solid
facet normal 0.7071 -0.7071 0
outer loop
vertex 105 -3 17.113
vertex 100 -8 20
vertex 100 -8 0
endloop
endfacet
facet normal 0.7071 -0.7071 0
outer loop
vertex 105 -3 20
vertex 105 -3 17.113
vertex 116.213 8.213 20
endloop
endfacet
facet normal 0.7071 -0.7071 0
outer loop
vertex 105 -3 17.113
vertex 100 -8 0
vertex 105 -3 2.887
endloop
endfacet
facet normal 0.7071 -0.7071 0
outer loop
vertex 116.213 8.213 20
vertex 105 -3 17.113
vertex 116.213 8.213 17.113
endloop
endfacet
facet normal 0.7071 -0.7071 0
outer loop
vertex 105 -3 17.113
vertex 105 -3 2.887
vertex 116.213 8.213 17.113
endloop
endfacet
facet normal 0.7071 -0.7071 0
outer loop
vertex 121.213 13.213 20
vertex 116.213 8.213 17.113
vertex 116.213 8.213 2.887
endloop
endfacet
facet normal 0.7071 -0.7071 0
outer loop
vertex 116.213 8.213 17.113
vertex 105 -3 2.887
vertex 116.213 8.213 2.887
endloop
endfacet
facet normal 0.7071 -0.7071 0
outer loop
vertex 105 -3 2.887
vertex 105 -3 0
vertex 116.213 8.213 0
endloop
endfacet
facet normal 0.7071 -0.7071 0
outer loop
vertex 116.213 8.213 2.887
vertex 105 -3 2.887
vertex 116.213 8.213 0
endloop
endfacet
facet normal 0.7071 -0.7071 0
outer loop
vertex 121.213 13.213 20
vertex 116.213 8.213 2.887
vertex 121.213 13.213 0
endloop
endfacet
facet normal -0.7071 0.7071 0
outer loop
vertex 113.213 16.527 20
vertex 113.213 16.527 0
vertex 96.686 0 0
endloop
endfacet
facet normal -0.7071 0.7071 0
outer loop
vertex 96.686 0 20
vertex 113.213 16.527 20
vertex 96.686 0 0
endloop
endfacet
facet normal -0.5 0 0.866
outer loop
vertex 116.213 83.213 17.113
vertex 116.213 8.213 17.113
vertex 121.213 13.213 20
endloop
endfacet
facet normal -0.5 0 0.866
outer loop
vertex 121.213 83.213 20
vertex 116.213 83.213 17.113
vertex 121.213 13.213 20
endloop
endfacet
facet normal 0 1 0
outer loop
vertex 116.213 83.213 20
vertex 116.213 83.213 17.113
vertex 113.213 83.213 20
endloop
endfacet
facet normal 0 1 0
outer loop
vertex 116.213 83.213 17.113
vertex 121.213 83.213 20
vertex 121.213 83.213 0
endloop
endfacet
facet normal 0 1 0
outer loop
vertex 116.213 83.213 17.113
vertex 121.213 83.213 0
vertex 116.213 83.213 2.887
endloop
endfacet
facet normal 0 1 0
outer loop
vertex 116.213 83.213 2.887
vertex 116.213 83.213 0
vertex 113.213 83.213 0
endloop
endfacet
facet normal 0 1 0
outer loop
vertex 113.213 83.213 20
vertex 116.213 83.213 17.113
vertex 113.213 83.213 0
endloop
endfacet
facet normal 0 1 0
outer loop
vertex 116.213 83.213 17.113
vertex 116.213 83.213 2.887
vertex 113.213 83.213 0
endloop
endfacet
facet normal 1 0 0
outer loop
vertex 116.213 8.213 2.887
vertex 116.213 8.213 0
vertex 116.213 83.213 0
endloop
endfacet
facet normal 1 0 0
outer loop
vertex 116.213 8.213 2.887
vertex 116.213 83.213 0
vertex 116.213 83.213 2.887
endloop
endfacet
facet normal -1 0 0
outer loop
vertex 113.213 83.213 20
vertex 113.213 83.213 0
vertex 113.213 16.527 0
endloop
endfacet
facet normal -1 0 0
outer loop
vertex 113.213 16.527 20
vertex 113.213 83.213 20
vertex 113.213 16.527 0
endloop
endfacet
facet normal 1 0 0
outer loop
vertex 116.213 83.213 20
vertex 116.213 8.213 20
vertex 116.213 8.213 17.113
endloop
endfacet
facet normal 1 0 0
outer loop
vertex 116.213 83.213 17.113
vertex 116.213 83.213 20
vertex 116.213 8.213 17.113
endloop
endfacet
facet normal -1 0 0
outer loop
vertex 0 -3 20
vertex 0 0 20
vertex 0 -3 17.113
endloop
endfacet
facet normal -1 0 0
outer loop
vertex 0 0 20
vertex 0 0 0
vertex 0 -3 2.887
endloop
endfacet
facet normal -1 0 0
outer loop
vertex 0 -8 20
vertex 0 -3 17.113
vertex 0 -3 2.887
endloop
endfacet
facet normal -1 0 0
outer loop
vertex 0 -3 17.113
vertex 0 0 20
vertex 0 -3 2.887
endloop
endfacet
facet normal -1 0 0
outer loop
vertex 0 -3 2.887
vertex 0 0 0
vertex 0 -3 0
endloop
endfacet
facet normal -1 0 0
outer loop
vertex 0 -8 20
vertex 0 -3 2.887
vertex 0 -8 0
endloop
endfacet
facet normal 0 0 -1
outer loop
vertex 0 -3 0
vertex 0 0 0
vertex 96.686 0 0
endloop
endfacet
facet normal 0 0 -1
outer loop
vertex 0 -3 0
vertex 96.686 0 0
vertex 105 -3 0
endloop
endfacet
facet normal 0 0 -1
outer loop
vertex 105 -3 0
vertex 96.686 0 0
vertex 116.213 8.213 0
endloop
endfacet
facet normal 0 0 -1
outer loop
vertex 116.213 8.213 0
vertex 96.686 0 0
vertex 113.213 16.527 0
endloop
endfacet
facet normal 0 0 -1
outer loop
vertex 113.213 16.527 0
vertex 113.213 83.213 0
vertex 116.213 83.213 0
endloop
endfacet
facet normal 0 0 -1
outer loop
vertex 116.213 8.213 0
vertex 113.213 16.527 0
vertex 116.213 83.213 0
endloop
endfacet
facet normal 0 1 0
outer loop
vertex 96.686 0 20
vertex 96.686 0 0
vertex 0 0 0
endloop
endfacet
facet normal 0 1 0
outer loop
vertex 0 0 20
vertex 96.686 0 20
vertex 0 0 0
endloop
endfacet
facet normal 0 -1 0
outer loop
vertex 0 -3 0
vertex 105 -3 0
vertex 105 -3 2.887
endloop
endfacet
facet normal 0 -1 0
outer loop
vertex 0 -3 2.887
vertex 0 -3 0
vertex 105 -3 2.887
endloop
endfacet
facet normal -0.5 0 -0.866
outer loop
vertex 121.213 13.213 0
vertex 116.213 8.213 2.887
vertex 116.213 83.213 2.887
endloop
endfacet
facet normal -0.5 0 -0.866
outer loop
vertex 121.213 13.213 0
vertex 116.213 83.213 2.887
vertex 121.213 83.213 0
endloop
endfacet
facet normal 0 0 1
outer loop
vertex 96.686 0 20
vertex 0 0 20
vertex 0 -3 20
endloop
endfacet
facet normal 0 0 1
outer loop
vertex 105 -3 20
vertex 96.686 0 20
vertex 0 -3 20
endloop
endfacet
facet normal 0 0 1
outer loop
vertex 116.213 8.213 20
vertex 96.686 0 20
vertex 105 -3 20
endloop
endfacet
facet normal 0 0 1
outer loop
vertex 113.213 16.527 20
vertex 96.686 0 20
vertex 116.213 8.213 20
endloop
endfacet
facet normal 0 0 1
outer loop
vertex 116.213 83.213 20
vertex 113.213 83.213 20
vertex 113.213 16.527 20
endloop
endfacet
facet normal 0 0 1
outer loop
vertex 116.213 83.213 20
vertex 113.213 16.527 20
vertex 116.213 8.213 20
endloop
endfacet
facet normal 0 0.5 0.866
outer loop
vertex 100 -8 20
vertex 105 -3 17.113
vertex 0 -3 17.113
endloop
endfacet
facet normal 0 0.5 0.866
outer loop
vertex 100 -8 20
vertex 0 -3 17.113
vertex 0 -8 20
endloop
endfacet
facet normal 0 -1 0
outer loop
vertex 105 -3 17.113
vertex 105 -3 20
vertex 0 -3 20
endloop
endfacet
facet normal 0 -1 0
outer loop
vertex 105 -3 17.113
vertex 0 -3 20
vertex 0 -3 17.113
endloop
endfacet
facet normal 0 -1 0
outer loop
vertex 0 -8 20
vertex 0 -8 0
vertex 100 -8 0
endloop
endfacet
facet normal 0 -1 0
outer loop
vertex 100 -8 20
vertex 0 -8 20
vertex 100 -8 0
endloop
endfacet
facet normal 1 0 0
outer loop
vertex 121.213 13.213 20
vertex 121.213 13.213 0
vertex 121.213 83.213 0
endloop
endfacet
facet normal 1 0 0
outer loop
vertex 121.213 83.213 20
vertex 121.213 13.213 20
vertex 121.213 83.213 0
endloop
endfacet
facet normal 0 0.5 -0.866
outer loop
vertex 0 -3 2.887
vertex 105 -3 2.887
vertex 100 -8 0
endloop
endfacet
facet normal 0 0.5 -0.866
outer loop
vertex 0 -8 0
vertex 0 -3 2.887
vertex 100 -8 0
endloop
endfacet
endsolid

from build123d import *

# Parameters (mm, degrees)
EXTRUDE_1_DEPTH     = 20
CUT_EXTRUDE_1_DEPTH = 149.381528207
CUT_EXTRUDE_2_DEPTH = 154.011402085


with BuildPart() as part:
    # Эскиз1 → Бобышка-Вытянуть1 (new body)
    with BuildSketch(Plane.XY):
        Polygon((0, 0), (0, -8), (100, -8), (121.213203436, 13.213203436), (121.213203436, 83.213203436), (113.213203436, 83.213203436), (113.213203436, 16.526911935), (96.686291501, 0), align=None)
    extrude(amount=EXTRUDE_1_DEPTH)

    # Эскиз2 → Вырез-Вытянуть1 (cut, through all)
    with BuildSketch(Plane.ZY):
        Polygon((0, -3), (2.886751346, -3), (0, -8), align=None)
        Polygon((20, -8), (20, -3), (17.113248654, -3), align=None)
    extrude(amount=-CUT_EXTRUDE_1_DEPTH, mode=Mode.SUBTRACT)

    # Эскиз3 → Вырез-Вытянуть2 (cut, through all)
    with BuildSketch(Plane(origin=(0, 83.213203436, 0), x_dir=(1, 0, 0), z_dir=(0, 1, 0))):
        Polygon((116.213203436, -20), (116.213203436, -17.113248654), (121.213203436, -20), align=None)
        Polygon((121.213203436, 0), (116.213203436, 0), (116.213203436, -2.886751346), align=None)
    extrude(amount=-CUT_EXTRUDE_2_DEPTH, mode=Mode.SUBTRACT)


solid = part.part
